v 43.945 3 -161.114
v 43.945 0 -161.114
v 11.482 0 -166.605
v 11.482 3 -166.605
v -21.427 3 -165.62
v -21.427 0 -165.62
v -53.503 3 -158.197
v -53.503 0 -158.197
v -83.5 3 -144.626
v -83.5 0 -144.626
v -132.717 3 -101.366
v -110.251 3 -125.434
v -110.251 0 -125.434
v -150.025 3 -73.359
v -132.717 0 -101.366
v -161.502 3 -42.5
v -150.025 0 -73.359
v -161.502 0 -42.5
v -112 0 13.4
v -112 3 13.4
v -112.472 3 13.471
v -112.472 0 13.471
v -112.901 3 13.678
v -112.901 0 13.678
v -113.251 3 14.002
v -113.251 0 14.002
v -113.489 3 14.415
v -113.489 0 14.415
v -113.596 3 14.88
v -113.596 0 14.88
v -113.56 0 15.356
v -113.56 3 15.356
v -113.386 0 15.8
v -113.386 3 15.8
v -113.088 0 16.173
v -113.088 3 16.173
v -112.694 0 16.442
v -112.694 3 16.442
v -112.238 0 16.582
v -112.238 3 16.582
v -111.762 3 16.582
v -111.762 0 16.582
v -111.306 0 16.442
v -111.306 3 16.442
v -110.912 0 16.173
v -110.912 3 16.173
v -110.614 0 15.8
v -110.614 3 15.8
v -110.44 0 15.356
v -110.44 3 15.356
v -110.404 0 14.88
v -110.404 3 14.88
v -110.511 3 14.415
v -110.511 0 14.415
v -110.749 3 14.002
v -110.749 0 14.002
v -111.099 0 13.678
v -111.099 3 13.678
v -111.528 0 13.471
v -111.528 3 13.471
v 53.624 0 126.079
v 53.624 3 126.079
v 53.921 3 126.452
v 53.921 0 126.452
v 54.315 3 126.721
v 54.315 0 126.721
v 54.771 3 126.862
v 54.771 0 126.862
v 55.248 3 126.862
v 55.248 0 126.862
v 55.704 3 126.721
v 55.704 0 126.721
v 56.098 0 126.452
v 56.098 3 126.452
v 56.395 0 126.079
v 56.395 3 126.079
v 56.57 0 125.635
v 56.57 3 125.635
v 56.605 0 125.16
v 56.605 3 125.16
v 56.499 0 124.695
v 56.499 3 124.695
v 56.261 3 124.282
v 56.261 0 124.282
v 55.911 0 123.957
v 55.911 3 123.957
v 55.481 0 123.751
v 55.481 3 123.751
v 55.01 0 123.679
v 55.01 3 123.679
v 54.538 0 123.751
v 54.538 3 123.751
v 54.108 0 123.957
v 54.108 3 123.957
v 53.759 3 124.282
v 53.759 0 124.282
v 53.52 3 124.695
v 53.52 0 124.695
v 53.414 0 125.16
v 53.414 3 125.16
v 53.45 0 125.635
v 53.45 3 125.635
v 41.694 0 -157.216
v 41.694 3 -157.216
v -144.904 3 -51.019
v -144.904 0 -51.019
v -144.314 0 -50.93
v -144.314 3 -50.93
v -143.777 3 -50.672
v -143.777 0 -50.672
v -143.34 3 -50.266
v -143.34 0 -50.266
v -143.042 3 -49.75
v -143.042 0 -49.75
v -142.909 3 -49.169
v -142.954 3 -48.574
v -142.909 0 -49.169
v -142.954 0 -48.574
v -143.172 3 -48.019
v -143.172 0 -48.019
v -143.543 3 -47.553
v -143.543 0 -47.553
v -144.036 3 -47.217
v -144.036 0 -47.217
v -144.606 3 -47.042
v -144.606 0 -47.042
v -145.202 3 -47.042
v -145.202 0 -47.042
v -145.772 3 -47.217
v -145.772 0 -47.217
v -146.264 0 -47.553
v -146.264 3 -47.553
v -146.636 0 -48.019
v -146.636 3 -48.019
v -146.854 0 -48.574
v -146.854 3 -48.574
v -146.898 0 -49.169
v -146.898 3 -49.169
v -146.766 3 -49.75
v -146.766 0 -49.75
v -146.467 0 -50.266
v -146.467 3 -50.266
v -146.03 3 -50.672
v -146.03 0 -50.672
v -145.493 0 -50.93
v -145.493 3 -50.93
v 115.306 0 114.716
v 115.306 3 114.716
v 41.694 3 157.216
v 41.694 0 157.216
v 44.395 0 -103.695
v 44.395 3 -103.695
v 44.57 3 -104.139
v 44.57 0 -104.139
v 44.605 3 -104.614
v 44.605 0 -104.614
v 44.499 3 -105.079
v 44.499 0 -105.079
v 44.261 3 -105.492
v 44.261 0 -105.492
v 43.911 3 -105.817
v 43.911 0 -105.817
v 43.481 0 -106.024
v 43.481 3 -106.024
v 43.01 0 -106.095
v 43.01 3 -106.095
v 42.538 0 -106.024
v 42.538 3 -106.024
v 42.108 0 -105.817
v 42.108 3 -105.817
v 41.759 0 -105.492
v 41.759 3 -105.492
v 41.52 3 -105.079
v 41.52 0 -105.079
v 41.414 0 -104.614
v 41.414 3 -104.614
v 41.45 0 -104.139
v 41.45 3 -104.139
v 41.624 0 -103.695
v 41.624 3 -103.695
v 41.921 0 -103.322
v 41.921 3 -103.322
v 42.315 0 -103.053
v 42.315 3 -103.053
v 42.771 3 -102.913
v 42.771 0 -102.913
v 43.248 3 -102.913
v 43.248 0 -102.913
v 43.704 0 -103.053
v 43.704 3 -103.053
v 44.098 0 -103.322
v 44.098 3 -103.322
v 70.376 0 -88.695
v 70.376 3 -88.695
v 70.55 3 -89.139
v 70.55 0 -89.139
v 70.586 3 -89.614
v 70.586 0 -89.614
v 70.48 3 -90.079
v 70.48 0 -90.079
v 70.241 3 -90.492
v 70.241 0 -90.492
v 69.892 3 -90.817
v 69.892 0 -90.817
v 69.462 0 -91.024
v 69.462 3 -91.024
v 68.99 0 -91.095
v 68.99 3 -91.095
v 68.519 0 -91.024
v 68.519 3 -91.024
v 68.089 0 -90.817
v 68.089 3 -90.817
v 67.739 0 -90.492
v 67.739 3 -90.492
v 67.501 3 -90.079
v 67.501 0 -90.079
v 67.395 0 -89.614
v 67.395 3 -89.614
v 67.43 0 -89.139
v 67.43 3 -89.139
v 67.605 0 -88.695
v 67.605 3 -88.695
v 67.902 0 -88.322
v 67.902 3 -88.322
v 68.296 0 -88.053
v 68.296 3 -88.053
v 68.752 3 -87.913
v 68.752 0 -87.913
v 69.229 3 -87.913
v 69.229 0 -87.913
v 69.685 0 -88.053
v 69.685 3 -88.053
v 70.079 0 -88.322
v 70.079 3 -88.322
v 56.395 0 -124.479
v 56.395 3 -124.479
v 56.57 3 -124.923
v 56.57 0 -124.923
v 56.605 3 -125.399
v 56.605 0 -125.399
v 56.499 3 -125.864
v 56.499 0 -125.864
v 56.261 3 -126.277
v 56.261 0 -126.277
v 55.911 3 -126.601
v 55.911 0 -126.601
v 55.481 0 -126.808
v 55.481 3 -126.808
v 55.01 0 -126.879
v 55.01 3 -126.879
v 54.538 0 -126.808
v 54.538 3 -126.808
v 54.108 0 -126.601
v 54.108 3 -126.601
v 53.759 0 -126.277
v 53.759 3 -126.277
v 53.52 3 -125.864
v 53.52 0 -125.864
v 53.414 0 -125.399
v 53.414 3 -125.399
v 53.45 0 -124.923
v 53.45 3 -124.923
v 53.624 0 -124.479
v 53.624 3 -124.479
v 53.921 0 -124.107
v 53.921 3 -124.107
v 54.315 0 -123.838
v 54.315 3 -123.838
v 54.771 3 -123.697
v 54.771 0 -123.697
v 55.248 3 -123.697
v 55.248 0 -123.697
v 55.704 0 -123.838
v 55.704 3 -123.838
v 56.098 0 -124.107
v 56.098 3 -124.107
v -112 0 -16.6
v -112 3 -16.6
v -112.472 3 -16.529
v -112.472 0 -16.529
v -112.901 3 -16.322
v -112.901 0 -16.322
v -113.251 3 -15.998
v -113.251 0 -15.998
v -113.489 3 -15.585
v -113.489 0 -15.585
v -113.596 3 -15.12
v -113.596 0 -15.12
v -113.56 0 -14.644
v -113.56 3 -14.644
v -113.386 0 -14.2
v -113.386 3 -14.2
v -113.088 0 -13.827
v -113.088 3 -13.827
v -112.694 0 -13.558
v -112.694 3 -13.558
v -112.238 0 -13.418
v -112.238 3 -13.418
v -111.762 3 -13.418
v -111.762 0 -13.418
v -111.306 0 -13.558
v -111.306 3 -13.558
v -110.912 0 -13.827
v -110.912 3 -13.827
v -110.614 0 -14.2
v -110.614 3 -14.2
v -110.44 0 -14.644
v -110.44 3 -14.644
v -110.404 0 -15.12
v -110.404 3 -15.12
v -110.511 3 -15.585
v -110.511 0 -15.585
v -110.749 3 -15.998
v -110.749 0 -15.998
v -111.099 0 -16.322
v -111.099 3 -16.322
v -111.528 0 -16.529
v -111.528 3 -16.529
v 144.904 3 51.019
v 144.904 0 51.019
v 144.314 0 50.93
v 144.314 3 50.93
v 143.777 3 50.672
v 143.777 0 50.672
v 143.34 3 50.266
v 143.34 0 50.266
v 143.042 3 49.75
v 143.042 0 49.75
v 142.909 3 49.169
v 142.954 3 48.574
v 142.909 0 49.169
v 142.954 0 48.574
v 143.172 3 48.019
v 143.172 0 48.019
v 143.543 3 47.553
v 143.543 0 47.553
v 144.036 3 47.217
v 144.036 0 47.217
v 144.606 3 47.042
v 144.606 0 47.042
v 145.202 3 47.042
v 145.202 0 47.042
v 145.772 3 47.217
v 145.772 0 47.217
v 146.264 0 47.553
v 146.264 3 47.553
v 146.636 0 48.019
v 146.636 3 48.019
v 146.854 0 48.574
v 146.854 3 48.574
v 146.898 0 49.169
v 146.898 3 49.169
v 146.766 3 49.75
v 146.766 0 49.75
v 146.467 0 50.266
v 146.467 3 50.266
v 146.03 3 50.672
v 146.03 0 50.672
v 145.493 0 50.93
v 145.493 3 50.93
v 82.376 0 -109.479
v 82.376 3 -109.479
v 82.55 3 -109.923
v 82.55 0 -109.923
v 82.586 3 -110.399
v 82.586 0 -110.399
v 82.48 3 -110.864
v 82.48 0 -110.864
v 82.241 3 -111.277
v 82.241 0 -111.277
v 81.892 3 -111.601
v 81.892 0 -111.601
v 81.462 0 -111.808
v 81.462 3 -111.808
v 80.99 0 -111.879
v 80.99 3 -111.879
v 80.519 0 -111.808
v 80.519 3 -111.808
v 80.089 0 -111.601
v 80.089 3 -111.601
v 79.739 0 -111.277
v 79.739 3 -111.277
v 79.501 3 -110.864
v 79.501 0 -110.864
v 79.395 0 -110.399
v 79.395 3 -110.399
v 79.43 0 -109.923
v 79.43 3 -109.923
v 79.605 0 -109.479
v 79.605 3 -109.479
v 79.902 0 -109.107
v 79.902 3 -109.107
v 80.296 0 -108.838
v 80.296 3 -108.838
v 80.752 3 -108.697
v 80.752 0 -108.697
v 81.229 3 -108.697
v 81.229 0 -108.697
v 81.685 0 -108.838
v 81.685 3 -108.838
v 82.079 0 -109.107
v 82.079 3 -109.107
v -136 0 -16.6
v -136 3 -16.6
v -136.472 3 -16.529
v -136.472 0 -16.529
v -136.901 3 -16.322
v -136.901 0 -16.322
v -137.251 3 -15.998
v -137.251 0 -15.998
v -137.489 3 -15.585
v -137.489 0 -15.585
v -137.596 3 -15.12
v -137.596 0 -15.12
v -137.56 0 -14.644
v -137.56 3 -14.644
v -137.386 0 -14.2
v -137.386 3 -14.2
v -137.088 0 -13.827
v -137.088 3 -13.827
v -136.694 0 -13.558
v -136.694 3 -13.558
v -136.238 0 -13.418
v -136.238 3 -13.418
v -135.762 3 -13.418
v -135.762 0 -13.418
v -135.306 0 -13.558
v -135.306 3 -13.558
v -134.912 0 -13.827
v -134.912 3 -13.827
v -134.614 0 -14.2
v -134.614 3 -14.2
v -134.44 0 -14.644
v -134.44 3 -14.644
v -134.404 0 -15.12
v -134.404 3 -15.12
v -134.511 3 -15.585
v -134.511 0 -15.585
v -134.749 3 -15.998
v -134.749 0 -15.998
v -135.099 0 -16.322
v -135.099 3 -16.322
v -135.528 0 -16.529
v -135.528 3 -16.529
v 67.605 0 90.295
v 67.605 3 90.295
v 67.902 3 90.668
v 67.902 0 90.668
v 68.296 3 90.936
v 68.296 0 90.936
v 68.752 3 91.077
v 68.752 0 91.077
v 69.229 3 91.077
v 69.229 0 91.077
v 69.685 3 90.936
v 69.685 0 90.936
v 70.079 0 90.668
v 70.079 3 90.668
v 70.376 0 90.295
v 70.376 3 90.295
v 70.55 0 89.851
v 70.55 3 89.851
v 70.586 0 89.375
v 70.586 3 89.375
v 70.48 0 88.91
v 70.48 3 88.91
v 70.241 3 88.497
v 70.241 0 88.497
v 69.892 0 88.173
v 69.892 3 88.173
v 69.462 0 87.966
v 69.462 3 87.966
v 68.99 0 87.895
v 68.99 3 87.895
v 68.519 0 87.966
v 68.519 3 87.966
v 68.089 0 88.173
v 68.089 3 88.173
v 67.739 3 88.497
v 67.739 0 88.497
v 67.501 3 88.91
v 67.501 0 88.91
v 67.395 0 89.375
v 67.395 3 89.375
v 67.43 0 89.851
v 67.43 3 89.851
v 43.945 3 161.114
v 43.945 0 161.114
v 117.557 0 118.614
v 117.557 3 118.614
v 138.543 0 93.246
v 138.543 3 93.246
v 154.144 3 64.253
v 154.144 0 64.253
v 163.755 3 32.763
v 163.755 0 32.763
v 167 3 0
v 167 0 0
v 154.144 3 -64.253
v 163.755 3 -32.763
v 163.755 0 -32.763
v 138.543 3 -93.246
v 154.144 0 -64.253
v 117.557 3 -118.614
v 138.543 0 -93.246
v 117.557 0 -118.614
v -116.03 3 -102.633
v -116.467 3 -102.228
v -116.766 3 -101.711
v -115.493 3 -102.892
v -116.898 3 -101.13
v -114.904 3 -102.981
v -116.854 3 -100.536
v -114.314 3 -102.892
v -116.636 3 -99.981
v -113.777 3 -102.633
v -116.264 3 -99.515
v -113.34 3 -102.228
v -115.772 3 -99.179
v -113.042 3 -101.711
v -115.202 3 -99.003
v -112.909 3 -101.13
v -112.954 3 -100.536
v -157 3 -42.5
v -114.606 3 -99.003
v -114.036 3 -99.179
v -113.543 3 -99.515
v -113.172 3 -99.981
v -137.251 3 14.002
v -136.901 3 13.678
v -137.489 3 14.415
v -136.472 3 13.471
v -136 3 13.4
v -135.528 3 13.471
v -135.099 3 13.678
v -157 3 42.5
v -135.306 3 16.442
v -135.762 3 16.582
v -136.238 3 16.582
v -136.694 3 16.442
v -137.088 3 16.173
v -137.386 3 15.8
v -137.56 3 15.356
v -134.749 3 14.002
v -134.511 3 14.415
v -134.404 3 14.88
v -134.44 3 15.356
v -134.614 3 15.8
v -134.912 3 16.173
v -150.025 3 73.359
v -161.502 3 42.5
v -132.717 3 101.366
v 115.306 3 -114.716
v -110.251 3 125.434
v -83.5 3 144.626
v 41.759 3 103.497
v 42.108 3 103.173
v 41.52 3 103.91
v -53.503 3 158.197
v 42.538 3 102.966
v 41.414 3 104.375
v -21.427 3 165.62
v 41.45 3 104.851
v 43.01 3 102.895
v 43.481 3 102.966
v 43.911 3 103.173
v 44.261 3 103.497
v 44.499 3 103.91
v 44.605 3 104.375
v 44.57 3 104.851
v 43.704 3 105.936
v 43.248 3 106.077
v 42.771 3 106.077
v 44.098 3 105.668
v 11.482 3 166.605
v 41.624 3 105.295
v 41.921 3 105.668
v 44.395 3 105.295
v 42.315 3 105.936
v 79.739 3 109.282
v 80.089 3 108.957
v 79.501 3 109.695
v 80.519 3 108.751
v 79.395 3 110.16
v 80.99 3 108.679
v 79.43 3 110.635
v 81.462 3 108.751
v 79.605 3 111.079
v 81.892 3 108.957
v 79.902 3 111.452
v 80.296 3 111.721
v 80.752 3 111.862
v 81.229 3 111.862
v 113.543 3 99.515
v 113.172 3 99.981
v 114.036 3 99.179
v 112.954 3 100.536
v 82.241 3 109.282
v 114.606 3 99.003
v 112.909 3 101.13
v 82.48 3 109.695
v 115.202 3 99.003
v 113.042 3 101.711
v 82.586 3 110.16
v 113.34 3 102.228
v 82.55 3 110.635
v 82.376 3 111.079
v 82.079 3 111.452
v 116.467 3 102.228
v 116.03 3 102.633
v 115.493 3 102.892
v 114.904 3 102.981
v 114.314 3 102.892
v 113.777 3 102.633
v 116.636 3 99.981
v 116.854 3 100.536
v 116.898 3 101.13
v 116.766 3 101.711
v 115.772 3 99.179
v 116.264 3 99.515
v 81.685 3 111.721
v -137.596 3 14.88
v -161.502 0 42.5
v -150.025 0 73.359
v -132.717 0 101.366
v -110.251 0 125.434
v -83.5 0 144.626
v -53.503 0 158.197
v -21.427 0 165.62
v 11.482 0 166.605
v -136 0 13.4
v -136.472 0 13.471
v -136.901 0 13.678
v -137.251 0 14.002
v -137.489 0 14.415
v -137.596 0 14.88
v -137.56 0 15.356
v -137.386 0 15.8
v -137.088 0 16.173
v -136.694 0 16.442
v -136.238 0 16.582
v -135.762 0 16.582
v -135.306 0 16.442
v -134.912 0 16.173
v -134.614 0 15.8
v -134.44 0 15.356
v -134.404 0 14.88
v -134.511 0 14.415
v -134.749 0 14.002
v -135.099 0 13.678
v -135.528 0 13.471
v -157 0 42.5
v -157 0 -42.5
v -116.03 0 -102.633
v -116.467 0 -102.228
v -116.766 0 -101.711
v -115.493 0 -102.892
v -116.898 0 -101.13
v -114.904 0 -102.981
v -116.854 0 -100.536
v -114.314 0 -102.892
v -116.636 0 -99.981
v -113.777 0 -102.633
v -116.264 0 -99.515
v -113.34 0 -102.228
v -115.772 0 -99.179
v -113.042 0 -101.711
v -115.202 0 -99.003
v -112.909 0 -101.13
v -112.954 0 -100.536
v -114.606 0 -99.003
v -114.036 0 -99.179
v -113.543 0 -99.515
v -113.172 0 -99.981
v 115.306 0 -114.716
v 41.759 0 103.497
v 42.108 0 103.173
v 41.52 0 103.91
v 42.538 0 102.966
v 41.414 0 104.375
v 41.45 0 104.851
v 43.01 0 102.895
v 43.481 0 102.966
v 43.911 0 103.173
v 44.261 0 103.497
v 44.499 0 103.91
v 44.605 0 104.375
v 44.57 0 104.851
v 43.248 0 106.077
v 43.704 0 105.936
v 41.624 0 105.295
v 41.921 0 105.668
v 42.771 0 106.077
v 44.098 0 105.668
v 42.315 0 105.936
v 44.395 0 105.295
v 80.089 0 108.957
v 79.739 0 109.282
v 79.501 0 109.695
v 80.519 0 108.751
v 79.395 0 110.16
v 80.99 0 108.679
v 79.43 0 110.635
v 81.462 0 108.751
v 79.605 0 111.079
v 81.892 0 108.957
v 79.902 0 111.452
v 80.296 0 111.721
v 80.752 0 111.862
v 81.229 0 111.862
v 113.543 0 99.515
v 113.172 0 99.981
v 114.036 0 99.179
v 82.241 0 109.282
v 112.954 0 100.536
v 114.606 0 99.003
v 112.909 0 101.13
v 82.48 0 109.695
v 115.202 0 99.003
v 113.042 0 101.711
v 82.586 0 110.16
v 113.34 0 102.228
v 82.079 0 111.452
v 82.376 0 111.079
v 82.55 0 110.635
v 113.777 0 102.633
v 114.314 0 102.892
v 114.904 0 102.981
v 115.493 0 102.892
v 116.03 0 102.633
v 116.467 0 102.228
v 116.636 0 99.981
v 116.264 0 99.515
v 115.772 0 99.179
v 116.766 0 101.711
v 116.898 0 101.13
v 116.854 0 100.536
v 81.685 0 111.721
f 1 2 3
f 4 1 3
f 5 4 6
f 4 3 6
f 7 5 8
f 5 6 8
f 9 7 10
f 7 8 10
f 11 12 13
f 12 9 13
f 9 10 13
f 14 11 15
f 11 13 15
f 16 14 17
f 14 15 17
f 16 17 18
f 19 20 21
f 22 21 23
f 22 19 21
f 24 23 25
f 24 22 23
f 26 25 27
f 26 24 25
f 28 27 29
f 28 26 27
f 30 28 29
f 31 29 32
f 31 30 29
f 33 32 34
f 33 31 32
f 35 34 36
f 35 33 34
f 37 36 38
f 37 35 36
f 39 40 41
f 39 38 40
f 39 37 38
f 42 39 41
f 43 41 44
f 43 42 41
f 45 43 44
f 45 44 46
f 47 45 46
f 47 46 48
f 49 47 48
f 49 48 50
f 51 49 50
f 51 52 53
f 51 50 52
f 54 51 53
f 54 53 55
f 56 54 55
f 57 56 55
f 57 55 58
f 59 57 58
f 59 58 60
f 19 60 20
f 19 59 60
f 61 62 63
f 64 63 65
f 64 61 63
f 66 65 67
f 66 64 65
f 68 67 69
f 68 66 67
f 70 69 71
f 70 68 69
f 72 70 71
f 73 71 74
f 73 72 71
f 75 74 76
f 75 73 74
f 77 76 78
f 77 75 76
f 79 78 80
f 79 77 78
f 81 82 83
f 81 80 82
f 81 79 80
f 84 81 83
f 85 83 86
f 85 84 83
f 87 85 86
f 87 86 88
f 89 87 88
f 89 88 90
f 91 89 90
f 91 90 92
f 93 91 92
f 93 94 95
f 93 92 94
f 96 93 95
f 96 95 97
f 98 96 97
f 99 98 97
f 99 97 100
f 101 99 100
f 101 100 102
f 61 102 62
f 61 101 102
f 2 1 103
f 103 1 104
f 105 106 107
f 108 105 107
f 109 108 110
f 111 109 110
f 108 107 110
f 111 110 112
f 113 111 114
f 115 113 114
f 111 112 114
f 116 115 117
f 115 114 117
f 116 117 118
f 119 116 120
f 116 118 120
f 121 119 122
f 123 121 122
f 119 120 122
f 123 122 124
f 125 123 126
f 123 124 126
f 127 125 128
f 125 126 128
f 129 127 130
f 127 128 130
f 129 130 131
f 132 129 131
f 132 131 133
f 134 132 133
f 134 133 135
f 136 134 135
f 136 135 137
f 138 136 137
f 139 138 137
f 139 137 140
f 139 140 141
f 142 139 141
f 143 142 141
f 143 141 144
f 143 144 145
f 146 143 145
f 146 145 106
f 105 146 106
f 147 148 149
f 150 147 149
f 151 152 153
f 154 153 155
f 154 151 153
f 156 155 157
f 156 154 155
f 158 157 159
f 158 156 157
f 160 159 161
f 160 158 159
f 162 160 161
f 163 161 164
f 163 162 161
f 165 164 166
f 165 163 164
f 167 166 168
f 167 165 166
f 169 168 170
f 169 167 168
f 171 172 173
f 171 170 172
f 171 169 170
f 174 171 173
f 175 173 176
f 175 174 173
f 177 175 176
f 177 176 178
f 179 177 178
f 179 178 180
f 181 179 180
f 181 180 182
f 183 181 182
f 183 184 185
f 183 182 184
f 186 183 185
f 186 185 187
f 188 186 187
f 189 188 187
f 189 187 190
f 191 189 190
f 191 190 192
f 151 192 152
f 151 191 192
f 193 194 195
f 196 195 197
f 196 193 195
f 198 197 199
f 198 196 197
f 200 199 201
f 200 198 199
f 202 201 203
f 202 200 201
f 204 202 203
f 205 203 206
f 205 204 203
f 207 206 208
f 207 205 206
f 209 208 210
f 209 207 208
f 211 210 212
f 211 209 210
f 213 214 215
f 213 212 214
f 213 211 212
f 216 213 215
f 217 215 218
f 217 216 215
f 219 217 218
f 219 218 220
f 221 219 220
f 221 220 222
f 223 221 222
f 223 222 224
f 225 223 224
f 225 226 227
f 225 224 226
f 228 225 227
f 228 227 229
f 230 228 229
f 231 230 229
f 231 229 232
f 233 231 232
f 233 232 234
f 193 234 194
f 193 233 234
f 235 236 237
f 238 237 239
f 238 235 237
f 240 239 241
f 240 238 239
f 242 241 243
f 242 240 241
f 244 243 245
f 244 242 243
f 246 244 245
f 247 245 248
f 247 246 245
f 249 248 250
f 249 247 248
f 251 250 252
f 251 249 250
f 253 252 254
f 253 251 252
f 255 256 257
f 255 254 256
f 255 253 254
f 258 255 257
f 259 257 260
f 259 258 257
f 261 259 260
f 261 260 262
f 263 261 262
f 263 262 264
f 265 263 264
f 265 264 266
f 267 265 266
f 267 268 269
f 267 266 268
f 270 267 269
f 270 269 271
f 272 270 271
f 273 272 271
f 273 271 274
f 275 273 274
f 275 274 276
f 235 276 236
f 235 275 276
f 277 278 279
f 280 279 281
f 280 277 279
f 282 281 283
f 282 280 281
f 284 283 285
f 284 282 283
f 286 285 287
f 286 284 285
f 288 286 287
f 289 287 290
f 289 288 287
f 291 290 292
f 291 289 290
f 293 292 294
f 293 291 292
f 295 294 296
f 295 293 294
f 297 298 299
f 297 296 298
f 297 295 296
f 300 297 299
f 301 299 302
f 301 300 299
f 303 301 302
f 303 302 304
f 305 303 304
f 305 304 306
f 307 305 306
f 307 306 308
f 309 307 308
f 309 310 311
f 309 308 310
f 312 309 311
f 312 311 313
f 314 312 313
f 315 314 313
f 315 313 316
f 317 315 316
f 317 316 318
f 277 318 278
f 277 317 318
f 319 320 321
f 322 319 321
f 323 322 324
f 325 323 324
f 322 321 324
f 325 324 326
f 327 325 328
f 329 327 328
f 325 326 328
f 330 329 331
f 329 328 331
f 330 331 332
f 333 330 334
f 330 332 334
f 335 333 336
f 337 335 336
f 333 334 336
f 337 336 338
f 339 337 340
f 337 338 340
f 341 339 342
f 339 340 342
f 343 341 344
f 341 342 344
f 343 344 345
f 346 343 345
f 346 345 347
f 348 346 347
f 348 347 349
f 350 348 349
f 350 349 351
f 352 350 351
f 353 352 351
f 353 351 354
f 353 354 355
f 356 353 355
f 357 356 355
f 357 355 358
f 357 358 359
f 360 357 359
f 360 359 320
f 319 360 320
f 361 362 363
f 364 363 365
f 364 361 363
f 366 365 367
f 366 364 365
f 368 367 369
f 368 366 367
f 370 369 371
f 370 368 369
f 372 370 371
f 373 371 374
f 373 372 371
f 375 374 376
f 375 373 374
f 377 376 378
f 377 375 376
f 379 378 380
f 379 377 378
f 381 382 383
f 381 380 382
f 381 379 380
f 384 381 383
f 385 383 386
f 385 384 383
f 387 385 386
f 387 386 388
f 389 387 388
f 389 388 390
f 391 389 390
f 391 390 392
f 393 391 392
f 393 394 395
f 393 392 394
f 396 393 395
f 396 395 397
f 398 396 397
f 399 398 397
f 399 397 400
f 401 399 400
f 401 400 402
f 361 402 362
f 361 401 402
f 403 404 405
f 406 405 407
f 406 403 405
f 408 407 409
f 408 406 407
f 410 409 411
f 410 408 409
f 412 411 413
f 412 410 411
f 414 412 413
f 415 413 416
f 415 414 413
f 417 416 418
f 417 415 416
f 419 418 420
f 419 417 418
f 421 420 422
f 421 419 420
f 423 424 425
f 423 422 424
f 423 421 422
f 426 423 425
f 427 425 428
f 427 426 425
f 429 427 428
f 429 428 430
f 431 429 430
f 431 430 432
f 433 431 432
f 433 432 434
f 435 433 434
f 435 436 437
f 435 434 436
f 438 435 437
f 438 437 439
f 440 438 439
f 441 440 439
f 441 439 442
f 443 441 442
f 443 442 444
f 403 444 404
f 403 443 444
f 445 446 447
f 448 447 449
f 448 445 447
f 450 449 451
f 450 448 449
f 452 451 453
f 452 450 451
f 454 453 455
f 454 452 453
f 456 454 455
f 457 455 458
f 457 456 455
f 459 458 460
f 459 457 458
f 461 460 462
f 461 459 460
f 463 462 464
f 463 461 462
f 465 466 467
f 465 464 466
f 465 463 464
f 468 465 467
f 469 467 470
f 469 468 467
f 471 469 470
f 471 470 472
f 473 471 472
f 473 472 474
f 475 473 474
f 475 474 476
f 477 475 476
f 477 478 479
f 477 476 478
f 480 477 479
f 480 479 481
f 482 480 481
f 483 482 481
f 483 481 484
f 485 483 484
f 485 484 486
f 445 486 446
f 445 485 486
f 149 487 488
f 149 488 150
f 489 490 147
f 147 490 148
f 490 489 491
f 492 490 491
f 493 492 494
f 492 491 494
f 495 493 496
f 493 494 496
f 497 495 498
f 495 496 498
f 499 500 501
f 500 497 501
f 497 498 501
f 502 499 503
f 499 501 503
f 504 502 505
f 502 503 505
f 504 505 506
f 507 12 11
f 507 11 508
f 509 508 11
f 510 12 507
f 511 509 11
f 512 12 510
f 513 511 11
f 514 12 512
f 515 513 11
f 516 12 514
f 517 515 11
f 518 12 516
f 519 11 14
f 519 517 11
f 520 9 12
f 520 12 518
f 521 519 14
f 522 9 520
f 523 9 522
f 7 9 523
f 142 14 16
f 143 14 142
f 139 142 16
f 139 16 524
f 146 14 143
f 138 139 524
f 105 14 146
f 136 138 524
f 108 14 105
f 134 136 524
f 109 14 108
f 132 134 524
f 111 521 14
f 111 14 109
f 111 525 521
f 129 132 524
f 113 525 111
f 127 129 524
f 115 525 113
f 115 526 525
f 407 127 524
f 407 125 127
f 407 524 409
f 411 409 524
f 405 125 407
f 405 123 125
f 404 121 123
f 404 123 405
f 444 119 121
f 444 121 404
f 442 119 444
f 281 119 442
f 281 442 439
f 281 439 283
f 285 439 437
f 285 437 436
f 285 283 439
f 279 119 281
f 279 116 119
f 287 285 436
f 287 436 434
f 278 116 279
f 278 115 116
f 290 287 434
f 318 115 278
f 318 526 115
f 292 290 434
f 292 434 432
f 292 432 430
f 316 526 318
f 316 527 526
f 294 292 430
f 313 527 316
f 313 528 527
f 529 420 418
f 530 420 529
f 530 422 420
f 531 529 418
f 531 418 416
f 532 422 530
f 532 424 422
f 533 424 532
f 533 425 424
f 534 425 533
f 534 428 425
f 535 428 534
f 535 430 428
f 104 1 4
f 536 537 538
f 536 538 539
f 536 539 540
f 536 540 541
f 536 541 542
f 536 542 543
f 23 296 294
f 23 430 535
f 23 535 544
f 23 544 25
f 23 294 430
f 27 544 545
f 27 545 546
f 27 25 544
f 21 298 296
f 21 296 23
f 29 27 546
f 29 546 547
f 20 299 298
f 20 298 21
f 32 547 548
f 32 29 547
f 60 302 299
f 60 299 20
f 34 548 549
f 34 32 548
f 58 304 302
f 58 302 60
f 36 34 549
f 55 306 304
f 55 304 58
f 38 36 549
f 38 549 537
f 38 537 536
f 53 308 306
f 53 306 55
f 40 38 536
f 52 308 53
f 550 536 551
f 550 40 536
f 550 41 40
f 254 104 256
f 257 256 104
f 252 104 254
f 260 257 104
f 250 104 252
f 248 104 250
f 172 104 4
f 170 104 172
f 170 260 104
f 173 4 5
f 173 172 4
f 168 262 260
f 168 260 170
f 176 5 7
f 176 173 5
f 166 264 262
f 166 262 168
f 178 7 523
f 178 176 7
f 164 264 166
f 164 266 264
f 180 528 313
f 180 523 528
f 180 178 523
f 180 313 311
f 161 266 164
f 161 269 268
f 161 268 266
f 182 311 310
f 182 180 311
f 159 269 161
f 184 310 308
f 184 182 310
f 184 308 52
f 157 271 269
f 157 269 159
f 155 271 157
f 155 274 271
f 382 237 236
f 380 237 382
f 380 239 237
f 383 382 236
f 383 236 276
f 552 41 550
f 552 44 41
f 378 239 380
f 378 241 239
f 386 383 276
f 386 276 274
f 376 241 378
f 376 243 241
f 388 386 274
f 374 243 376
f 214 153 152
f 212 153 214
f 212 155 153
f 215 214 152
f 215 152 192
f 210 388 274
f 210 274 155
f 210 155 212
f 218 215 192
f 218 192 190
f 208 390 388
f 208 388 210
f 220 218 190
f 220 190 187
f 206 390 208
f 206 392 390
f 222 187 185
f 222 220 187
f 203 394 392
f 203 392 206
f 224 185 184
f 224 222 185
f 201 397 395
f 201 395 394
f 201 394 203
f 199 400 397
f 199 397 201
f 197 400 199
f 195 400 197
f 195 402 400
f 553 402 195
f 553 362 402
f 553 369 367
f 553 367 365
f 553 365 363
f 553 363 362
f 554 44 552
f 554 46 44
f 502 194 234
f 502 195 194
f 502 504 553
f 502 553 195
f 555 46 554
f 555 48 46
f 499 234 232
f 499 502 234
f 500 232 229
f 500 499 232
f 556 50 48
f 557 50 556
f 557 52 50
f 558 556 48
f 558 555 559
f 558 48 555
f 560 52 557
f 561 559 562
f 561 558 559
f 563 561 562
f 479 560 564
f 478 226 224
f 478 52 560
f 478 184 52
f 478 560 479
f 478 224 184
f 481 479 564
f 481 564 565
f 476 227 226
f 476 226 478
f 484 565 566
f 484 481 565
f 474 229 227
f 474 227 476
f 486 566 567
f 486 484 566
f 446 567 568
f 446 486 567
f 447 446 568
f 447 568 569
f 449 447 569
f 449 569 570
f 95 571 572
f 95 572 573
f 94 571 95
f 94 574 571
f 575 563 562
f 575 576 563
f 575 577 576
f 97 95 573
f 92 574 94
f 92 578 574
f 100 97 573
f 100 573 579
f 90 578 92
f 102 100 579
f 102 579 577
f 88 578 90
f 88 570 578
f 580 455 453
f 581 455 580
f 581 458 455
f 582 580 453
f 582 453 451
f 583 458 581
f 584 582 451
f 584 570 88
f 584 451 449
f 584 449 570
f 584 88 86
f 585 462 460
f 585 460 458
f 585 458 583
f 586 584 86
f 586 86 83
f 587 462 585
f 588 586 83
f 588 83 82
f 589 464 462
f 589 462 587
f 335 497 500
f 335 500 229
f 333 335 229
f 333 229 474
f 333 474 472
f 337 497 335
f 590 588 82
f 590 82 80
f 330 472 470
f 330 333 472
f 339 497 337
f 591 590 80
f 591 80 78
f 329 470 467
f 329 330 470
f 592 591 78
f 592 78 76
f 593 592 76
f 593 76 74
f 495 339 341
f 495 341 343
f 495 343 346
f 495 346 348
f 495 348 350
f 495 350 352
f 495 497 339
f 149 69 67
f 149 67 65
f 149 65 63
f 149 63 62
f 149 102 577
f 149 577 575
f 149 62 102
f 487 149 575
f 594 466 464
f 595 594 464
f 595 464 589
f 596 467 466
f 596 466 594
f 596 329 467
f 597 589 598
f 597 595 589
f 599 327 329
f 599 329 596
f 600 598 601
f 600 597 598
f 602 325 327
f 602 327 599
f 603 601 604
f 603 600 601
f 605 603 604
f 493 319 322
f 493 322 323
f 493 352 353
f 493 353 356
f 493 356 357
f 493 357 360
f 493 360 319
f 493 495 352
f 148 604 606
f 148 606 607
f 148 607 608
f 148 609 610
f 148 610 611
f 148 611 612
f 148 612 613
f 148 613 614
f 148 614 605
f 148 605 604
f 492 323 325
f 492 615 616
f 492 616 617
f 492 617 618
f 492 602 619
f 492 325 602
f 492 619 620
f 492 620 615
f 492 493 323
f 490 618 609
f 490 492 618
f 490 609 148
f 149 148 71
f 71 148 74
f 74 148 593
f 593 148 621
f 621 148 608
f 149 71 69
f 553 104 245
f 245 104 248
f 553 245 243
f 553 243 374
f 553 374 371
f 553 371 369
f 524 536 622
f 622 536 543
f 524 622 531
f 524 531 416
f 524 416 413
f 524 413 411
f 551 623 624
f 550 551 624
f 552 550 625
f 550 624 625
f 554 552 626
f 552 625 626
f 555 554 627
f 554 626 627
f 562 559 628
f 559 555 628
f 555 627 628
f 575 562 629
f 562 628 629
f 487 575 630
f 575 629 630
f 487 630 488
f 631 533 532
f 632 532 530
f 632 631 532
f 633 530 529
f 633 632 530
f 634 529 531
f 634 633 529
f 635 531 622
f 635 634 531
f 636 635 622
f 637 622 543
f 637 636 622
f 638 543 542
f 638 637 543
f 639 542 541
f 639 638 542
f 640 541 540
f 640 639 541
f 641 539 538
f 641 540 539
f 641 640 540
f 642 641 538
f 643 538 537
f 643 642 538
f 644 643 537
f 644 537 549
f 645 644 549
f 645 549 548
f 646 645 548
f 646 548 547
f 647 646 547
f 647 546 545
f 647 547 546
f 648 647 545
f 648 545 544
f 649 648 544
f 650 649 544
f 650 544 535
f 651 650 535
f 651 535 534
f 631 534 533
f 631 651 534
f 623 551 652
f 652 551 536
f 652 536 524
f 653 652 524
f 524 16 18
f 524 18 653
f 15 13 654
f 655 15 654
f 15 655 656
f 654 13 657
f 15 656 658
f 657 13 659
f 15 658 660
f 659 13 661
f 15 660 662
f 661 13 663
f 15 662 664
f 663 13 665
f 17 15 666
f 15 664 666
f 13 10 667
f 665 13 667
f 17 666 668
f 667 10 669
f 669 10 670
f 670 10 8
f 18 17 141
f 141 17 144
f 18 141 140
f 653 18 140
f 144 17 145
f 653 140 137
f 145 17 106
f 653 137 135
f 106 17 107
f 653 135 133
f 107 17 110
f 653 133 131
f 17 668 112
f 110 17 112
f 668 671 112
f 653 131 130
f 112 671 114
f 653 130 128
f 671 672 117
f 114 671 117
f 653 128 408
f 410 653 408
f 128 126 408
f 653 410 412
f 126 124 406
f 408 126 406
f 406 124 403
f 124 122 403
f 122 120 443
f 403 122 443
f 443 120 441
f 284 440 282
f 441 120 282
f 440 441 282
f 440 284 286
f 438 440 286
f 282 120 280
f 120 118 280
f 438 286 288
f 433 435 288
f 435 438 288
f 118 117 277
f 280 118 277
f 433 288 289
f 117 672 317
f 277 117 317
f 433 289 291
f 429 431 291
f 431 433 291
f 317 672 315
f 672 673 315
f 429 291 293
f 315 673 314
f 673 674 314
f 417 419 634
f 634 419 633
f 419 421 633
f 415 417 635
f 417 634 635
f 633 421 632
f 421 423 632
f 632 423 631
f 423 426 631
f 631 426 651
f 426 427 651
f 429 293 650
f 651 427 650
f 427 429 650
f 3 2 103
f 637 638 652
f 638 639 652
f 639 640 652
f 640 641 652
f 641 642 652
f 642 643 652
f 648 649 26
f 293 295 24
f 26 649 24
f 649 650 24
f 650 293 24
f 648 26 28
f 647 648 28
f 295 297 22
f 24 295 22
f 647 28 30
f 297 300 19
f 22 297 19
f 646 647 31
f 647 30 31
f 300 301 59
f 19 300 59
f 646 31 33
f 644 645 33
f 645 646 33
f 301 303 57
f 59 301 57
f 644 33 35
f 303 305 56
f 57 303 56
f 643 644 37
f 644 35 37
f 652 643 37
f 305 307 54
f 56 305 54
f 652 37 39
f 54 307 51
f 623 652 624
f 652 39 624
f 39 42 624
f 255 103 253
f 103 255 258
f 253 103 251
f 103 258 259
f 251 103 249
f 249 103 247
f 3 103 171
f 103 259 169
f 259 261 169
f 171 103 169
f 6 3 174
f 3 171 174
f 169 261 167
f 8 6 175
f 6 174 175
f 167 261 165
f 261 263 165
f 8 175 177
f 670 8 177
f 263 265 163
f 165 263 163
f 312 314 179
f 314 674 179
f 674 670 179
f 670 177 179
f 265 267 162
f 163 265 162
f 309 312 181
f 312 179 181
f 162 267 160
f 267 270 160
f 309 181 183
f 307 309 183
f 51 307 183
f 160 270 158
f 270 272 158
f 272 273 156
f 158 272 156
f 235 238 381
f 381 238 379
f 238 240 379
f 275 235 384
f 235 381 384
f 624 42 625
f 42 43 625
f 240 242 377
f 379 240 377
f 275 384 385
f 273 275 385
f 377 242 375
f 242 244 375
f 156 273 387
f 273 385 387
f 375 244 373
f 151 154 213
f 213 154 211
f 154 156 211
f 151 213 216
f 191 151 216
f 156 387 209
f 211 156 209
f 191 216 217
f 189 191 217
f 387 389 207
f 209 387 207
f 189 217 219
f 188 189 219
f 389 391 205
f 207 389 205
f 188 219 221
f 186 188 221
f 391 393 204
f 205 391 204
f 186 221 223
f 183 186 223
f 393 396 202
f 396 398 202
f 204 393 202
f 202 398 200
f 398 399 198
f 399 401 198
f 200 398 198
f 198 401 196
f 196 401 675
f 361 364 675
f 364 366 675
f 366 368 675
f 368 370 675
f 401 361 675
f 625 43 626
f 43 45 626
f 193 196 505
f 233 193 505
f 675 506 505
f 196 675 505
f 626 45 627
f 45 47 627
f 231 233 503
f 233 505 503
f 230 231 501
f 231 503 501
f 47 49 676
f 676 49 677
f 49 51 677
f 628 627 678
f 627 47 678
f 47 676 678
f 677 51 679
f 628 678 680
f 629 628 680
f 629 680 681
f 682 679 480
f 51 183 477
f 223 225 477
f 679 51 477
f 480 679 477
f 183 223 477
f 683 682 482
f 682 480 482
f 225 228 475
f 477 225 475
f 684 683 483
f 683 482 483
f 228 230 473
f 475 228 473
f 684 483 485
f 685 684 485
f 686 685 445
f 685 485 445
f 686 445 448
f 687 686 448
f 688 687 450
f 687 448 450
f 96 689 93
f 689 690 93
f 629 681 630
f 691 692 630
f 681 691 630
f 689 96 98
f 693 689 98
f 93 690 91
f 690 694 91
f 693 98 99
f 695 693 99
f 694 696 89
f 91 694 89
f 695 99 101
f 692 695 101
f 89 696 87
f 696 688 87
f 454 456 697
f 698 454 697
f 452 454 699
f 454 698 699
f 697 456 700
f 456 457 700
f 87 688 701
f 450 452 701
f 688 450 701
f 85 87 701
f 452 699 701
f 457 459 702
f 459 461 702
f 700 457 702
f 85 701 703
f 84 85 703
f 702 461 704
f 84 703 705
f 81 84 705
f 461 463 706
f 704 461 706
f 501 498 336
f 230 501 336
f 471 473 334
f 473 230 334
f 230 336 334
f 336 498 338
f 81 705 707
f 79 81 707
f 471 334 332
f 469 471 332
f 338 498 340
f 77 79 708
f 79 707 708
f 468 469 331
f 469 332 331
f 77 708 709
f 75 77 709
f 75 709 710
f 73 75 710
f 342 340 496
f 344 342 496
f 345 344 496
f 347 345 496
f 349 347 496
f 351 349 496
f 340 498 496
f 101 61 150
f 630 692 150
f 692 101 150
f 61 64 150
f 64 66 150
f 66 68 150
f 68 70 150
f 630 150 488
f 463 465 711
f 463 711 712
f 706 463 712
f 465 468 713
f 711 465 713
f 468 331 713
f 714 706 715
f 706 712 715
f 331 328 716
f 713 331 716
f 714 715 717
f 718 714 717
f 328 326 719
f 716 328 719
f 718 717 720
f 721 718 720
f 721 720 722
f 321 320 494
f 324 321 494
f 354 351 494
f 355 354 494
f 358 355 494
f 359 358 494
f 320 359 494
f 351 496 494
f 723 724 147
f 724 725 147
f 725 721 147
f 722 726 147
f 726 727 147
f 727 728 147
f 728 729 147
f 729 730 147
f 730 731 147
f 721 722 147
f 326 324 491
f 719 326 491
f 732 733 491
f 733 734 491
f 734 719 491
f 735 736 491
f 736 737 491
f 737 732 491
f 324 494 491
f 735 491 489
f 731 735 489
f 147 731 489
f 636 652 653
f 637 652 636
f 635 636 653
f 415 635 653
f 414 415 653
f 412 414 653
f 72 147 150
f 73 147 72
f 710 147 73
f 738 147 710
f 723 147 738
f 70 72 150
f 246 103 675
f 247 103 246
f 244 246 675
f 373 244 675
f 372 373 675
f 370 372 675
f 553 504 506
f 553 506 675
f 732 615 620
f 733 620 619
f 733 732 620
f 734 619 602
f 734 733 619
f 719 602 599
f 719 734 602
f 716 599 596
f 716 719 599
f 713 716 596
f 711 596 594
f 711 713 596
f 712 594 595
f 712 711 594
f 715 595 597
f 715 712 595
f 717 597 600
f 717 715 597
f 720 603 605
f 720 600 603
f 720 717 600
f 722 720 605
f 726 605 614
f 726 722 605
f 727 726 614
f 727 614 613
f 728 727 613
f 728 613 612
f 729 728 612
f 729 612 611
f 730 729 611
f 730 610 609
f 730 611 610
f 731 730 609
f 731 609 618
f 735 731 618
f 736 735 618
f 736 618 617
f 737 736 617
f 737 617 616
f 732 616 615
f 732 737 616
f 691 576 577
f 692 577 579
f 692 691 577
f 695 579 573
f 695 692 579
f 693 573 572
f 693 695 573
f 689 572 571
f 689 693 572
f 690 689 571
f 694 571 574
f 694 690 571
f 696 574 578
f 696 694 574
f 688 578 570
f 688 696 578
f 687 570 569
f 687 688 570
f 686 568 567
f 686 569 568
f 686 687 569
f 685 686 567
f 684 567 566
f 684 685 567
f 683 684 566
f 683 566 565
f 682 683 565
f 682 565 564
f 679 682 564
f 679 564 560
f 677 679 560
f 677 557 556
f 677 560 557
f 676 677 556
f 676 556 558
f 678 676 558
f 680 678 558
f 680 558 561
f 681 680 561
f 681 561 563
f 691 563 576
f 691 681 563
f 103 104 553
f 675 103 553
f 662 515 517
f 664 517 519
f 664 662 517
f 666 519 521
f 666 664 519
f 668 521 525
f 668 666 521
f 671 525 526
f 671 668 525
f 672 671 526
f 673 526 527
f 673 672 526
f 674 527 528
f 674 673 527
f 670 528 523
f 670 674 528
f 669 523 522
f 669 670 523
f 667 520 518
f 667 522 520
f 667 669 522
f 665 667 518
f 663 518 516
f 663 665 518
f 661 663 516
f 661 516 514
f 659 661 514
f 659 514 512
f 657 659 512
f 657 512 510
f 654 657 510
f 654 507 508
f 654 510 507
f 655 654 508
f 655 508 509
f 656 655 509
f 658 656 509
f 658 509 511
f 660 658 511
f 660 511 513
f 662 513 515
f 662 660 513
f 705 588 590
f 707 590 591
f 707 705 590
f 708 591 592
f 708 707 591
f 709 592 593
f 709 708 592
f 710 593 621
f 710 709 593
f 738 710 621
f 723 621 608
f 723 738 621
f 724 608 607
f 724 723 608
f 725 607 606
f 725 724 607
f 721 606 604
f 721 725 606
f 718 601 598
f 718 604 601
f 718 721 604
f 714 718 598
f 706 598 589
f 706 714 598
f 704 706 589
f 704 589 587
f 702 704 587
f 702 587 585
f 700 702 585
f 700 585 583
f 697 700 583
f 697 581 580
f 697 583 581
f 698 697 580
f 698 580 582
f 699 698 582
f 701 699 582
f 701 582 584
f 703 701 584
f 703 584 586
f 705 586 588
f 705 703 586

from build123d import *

# Parameters (mm, degrees)
SKETCH_2_R               = 167
EXTRUDE_1_DEPTH          = 3
CUT_EXTRUDE_3_REACH      = 238.193
SKETCH_1_R               = 1.6
PATTERN_CIRCULAR_1_COUNT = 3
CUT_EXTRUDE_4_REACH      = 238.193
SKETCH_3_W               = 90.124680173
SKETCH_3_H               = 85
PATTERN_CIRCULAR_2_COUNT = 3
SKETCH_4_R               = 2
CUT_EXTRUDE_5_DEPTH      = 10
MIRROR_2_COPY_1_SKETCH_R = 2
MIRROR_2_COPY_1_DEPTH    = 10


with BuildPart() as part:
    # 草图2 → 凸台-拉伸1 (new body)
    with BuildSketch(Plane(origin=(0, 0, 0), x_dir=(1, 0, 0), z_dir=(0, 1, 0))):
        Circle(SKETCH_2_R)
    extrude(amount=EXTRUDE_1_DEPTH)

    # 草图1 → 切除-拉伸3 (cut, up to next)
    with BuildSketch(Plane(origin=(0, 0, 0), x_dir=(1, 0, 0), z_dir=(0, 1, 0)), mode=Mode.PRIVATE) as cut_extrude_3_sk1:
        with Locations((-112, 15)):
            Circle(SKETCH_1_R)
    cut_extrude_3_tool1 = extrude(cut_extrude_3_sk1.sketch, amount=CUT_EXTRUDE_3_REACH, mode=Mode.PRIVATE) & part.part
    # 草图1 → 切除-拉伸3 (cut, up to next)
    with BuildSketch(Plane(origin=(0, 0, 0), x_dir=(1, 0, 0), z_dir=(0, 1, 0)), mode=Mode.PRIVATE) as cut_extrude_3_sk2:
        with Locations((-112, -15)):
            Circle(SKETCH_1_R)
    cut_extrude_3_tool2 = extrude(cut_extrude_3_sk2.sketch, amount=CUT_EXTRUDE_3_REACH, mode=Mode.PRIVATE) & part.part
    # 草图1 → 切除-拉伸3 (cut, up to next)
    with BuildSketch(Plane(origin=(0, 0, 0), x_dir=(1, 0, 0), z_dir=(0, 1, 0)), mode=Mode.PRIVATE) as cut_extrude_3_sk3:
        with Locations((-136, 15)):
            Circle(SKETCH_1_R)
    cut_extrude_3_tool3 = extrude(cut_extrude_3_sk3.sketch, amount=CUT_EXTRUDE_3_REACH, mode=Mode.PRIVATE) & part.part
    # 草图1 → 切除-拉伸3 (cut, up to next)
    with BuildSketch(Plane(origin=(0, 0, 0), x_dir=(1, 0, 0), z_dir=(0, 1, 0)), mode=Mode.PRIVATE) as cut_extrude_3_sk4:
        with Locations((-136, -15)):
            Circle(SKETCH_1_R)
    cut_extrude_3_tool4 = extrude(cut_extrude_3_sk4.sketch, amount=CUT_EXTRUDE_3_REACH, mode=Mode.PRIVATE) & part.part
    cut_extrude_3_1 = cut_extrude_3_tool1.solids().sort_by_distance((-112, 0, -15))[0]
    add(cut_extrude_3_1, mode=Mode.SUBTRACT)
    cut_extrude_3_2 = cut_extrude_3_tool2.solids().sort_by_distance((-112, 0, 15))[0]
    add(cut_extrude_3_2, mode=Mode.SUBTRACT)
    cut_extrude_3_3 = cut_extrude_3_tool3.solids().sort_by_distance((-136, 0, -15))[0]
    add(cut_extrude_3_3, mode=Mode.SUBTRACT)
    cut_extrude_3_4 = cut_extrude_3_tool4.solids().sort_by_distance((-136, 0, 15))[0]
    add(cut_extrude_3_4, mode=Mode.SUBTRACT)
    cut_extrude_3 = cut_extrude_3_1 + cut_extrude_3_2 + cut_extrude_3_3 + cut_extrude_3_4  # 切除-拉伸3 as one shape, for the pattern or mirror that repeats it

    # 阵列(圆周)1: 切除-拉伸3 ×3 about axis
    pattern_circular_1_axis = Axis((0, 81.400407757, 0), (0, -1, 0))
    for i in range(1, PATTERN_CIRCULAR_1_COUNT):
        add(cut_extrude_3.rotate(pattern_circular_1_axis, i * 360 / PATTERN_CIRCULAR_1_COUNT), mode=Mode.SUBTRACT)

    # 草图3 → 切除-拉伸4 (cut, up to next)
    with BuildSketch(Plane(origin=(0, 3, 0), x_dir=(1, 0, 0), z_dir=(0, 1, 0)), mode=Mode.PRIVATE) as cut_extrude_4_sk1:
        with Locations((-202.062340087, 0)):
            Rectangle(SKETCH_3_W, SKETCH_3_H)
    cut_extrude_4_tool1 = extrude(cut_extrude_4_sk1.sketch, amount=-CUT_EXTRUDE_4_REACH, mode=Mode.PRIVATE) & part.part
    cut_extrude_4 = cut_extrude_4_tool1.solids().sort_by_distance((-202.06234, 3, 0))[0]
    add(cut_extrude_4, mode=Mode.SUBTRACT)

    # 阵列(圆周)2: 切除-拉伸4 ×3 about axis
    pattern_circular_2_axis = Axis((0, 81.400407757, 0), (0, -1, 0))
    for i in range(1, PATTERN_CIRCULAR_2_COUNT):
        add(cut_extrude_4.rotate(pattern_circular_2_axis, i * 360 / PATTERN_CIRCULAR_2_COUNT), mode=Mode.SUBTRACT)

    # 草图4 → 切除-拉伸5 (cut)
    with BuildSketch(Plane.XZ):
        with Locations((-144.903810568, -49.019237886)):
            Circle(SKETCH_4_R)
    cut_extrude_5 = extrude(amount=-CUT_EXTRUDE_5_DEPTH, mode=Mode.SUBTRACT)

    # 镜向1: 切除-拉伸5 across plane
    add(cut_extrude_5.mirror(Plane(origin=(0, 0, 0), x_dir=(0.8660254037844363, 0, 0.500000000000004), z_dir=(0.5000000000000042, 0, -0.8660254037844363))), mode=Mode.SUBTRACT)

    # 镜向2: 切除-拉伸5 across plane
    add(cut_extrude_5.mirror(Plane(origin=(0, 0, 0), x_dir=(-0.500000000000004, 0, 0.8660254037844363), z_dir=(-0.8660254037844365, 0, -0.500000000000004))), mode=Mode.SUBTRACT)

    # 镜向2 copy 1 sketch → 镜向2 copy 1 (cut)
    with BuildSketch(Plane(origin=(0, 0, 0), x_dir=(-1, 0, 0), z_dir=(0, -1, 0))):
        with Locations((-144.903810568, -49.019237886)):
            Circle(MIRROR_2_COPY_1_SKETCH_R)
    extrude(amount=-MIRROR_2_COPY_1_DEPTH, mode=Mode.SUBTRACT)


solid = part.part
